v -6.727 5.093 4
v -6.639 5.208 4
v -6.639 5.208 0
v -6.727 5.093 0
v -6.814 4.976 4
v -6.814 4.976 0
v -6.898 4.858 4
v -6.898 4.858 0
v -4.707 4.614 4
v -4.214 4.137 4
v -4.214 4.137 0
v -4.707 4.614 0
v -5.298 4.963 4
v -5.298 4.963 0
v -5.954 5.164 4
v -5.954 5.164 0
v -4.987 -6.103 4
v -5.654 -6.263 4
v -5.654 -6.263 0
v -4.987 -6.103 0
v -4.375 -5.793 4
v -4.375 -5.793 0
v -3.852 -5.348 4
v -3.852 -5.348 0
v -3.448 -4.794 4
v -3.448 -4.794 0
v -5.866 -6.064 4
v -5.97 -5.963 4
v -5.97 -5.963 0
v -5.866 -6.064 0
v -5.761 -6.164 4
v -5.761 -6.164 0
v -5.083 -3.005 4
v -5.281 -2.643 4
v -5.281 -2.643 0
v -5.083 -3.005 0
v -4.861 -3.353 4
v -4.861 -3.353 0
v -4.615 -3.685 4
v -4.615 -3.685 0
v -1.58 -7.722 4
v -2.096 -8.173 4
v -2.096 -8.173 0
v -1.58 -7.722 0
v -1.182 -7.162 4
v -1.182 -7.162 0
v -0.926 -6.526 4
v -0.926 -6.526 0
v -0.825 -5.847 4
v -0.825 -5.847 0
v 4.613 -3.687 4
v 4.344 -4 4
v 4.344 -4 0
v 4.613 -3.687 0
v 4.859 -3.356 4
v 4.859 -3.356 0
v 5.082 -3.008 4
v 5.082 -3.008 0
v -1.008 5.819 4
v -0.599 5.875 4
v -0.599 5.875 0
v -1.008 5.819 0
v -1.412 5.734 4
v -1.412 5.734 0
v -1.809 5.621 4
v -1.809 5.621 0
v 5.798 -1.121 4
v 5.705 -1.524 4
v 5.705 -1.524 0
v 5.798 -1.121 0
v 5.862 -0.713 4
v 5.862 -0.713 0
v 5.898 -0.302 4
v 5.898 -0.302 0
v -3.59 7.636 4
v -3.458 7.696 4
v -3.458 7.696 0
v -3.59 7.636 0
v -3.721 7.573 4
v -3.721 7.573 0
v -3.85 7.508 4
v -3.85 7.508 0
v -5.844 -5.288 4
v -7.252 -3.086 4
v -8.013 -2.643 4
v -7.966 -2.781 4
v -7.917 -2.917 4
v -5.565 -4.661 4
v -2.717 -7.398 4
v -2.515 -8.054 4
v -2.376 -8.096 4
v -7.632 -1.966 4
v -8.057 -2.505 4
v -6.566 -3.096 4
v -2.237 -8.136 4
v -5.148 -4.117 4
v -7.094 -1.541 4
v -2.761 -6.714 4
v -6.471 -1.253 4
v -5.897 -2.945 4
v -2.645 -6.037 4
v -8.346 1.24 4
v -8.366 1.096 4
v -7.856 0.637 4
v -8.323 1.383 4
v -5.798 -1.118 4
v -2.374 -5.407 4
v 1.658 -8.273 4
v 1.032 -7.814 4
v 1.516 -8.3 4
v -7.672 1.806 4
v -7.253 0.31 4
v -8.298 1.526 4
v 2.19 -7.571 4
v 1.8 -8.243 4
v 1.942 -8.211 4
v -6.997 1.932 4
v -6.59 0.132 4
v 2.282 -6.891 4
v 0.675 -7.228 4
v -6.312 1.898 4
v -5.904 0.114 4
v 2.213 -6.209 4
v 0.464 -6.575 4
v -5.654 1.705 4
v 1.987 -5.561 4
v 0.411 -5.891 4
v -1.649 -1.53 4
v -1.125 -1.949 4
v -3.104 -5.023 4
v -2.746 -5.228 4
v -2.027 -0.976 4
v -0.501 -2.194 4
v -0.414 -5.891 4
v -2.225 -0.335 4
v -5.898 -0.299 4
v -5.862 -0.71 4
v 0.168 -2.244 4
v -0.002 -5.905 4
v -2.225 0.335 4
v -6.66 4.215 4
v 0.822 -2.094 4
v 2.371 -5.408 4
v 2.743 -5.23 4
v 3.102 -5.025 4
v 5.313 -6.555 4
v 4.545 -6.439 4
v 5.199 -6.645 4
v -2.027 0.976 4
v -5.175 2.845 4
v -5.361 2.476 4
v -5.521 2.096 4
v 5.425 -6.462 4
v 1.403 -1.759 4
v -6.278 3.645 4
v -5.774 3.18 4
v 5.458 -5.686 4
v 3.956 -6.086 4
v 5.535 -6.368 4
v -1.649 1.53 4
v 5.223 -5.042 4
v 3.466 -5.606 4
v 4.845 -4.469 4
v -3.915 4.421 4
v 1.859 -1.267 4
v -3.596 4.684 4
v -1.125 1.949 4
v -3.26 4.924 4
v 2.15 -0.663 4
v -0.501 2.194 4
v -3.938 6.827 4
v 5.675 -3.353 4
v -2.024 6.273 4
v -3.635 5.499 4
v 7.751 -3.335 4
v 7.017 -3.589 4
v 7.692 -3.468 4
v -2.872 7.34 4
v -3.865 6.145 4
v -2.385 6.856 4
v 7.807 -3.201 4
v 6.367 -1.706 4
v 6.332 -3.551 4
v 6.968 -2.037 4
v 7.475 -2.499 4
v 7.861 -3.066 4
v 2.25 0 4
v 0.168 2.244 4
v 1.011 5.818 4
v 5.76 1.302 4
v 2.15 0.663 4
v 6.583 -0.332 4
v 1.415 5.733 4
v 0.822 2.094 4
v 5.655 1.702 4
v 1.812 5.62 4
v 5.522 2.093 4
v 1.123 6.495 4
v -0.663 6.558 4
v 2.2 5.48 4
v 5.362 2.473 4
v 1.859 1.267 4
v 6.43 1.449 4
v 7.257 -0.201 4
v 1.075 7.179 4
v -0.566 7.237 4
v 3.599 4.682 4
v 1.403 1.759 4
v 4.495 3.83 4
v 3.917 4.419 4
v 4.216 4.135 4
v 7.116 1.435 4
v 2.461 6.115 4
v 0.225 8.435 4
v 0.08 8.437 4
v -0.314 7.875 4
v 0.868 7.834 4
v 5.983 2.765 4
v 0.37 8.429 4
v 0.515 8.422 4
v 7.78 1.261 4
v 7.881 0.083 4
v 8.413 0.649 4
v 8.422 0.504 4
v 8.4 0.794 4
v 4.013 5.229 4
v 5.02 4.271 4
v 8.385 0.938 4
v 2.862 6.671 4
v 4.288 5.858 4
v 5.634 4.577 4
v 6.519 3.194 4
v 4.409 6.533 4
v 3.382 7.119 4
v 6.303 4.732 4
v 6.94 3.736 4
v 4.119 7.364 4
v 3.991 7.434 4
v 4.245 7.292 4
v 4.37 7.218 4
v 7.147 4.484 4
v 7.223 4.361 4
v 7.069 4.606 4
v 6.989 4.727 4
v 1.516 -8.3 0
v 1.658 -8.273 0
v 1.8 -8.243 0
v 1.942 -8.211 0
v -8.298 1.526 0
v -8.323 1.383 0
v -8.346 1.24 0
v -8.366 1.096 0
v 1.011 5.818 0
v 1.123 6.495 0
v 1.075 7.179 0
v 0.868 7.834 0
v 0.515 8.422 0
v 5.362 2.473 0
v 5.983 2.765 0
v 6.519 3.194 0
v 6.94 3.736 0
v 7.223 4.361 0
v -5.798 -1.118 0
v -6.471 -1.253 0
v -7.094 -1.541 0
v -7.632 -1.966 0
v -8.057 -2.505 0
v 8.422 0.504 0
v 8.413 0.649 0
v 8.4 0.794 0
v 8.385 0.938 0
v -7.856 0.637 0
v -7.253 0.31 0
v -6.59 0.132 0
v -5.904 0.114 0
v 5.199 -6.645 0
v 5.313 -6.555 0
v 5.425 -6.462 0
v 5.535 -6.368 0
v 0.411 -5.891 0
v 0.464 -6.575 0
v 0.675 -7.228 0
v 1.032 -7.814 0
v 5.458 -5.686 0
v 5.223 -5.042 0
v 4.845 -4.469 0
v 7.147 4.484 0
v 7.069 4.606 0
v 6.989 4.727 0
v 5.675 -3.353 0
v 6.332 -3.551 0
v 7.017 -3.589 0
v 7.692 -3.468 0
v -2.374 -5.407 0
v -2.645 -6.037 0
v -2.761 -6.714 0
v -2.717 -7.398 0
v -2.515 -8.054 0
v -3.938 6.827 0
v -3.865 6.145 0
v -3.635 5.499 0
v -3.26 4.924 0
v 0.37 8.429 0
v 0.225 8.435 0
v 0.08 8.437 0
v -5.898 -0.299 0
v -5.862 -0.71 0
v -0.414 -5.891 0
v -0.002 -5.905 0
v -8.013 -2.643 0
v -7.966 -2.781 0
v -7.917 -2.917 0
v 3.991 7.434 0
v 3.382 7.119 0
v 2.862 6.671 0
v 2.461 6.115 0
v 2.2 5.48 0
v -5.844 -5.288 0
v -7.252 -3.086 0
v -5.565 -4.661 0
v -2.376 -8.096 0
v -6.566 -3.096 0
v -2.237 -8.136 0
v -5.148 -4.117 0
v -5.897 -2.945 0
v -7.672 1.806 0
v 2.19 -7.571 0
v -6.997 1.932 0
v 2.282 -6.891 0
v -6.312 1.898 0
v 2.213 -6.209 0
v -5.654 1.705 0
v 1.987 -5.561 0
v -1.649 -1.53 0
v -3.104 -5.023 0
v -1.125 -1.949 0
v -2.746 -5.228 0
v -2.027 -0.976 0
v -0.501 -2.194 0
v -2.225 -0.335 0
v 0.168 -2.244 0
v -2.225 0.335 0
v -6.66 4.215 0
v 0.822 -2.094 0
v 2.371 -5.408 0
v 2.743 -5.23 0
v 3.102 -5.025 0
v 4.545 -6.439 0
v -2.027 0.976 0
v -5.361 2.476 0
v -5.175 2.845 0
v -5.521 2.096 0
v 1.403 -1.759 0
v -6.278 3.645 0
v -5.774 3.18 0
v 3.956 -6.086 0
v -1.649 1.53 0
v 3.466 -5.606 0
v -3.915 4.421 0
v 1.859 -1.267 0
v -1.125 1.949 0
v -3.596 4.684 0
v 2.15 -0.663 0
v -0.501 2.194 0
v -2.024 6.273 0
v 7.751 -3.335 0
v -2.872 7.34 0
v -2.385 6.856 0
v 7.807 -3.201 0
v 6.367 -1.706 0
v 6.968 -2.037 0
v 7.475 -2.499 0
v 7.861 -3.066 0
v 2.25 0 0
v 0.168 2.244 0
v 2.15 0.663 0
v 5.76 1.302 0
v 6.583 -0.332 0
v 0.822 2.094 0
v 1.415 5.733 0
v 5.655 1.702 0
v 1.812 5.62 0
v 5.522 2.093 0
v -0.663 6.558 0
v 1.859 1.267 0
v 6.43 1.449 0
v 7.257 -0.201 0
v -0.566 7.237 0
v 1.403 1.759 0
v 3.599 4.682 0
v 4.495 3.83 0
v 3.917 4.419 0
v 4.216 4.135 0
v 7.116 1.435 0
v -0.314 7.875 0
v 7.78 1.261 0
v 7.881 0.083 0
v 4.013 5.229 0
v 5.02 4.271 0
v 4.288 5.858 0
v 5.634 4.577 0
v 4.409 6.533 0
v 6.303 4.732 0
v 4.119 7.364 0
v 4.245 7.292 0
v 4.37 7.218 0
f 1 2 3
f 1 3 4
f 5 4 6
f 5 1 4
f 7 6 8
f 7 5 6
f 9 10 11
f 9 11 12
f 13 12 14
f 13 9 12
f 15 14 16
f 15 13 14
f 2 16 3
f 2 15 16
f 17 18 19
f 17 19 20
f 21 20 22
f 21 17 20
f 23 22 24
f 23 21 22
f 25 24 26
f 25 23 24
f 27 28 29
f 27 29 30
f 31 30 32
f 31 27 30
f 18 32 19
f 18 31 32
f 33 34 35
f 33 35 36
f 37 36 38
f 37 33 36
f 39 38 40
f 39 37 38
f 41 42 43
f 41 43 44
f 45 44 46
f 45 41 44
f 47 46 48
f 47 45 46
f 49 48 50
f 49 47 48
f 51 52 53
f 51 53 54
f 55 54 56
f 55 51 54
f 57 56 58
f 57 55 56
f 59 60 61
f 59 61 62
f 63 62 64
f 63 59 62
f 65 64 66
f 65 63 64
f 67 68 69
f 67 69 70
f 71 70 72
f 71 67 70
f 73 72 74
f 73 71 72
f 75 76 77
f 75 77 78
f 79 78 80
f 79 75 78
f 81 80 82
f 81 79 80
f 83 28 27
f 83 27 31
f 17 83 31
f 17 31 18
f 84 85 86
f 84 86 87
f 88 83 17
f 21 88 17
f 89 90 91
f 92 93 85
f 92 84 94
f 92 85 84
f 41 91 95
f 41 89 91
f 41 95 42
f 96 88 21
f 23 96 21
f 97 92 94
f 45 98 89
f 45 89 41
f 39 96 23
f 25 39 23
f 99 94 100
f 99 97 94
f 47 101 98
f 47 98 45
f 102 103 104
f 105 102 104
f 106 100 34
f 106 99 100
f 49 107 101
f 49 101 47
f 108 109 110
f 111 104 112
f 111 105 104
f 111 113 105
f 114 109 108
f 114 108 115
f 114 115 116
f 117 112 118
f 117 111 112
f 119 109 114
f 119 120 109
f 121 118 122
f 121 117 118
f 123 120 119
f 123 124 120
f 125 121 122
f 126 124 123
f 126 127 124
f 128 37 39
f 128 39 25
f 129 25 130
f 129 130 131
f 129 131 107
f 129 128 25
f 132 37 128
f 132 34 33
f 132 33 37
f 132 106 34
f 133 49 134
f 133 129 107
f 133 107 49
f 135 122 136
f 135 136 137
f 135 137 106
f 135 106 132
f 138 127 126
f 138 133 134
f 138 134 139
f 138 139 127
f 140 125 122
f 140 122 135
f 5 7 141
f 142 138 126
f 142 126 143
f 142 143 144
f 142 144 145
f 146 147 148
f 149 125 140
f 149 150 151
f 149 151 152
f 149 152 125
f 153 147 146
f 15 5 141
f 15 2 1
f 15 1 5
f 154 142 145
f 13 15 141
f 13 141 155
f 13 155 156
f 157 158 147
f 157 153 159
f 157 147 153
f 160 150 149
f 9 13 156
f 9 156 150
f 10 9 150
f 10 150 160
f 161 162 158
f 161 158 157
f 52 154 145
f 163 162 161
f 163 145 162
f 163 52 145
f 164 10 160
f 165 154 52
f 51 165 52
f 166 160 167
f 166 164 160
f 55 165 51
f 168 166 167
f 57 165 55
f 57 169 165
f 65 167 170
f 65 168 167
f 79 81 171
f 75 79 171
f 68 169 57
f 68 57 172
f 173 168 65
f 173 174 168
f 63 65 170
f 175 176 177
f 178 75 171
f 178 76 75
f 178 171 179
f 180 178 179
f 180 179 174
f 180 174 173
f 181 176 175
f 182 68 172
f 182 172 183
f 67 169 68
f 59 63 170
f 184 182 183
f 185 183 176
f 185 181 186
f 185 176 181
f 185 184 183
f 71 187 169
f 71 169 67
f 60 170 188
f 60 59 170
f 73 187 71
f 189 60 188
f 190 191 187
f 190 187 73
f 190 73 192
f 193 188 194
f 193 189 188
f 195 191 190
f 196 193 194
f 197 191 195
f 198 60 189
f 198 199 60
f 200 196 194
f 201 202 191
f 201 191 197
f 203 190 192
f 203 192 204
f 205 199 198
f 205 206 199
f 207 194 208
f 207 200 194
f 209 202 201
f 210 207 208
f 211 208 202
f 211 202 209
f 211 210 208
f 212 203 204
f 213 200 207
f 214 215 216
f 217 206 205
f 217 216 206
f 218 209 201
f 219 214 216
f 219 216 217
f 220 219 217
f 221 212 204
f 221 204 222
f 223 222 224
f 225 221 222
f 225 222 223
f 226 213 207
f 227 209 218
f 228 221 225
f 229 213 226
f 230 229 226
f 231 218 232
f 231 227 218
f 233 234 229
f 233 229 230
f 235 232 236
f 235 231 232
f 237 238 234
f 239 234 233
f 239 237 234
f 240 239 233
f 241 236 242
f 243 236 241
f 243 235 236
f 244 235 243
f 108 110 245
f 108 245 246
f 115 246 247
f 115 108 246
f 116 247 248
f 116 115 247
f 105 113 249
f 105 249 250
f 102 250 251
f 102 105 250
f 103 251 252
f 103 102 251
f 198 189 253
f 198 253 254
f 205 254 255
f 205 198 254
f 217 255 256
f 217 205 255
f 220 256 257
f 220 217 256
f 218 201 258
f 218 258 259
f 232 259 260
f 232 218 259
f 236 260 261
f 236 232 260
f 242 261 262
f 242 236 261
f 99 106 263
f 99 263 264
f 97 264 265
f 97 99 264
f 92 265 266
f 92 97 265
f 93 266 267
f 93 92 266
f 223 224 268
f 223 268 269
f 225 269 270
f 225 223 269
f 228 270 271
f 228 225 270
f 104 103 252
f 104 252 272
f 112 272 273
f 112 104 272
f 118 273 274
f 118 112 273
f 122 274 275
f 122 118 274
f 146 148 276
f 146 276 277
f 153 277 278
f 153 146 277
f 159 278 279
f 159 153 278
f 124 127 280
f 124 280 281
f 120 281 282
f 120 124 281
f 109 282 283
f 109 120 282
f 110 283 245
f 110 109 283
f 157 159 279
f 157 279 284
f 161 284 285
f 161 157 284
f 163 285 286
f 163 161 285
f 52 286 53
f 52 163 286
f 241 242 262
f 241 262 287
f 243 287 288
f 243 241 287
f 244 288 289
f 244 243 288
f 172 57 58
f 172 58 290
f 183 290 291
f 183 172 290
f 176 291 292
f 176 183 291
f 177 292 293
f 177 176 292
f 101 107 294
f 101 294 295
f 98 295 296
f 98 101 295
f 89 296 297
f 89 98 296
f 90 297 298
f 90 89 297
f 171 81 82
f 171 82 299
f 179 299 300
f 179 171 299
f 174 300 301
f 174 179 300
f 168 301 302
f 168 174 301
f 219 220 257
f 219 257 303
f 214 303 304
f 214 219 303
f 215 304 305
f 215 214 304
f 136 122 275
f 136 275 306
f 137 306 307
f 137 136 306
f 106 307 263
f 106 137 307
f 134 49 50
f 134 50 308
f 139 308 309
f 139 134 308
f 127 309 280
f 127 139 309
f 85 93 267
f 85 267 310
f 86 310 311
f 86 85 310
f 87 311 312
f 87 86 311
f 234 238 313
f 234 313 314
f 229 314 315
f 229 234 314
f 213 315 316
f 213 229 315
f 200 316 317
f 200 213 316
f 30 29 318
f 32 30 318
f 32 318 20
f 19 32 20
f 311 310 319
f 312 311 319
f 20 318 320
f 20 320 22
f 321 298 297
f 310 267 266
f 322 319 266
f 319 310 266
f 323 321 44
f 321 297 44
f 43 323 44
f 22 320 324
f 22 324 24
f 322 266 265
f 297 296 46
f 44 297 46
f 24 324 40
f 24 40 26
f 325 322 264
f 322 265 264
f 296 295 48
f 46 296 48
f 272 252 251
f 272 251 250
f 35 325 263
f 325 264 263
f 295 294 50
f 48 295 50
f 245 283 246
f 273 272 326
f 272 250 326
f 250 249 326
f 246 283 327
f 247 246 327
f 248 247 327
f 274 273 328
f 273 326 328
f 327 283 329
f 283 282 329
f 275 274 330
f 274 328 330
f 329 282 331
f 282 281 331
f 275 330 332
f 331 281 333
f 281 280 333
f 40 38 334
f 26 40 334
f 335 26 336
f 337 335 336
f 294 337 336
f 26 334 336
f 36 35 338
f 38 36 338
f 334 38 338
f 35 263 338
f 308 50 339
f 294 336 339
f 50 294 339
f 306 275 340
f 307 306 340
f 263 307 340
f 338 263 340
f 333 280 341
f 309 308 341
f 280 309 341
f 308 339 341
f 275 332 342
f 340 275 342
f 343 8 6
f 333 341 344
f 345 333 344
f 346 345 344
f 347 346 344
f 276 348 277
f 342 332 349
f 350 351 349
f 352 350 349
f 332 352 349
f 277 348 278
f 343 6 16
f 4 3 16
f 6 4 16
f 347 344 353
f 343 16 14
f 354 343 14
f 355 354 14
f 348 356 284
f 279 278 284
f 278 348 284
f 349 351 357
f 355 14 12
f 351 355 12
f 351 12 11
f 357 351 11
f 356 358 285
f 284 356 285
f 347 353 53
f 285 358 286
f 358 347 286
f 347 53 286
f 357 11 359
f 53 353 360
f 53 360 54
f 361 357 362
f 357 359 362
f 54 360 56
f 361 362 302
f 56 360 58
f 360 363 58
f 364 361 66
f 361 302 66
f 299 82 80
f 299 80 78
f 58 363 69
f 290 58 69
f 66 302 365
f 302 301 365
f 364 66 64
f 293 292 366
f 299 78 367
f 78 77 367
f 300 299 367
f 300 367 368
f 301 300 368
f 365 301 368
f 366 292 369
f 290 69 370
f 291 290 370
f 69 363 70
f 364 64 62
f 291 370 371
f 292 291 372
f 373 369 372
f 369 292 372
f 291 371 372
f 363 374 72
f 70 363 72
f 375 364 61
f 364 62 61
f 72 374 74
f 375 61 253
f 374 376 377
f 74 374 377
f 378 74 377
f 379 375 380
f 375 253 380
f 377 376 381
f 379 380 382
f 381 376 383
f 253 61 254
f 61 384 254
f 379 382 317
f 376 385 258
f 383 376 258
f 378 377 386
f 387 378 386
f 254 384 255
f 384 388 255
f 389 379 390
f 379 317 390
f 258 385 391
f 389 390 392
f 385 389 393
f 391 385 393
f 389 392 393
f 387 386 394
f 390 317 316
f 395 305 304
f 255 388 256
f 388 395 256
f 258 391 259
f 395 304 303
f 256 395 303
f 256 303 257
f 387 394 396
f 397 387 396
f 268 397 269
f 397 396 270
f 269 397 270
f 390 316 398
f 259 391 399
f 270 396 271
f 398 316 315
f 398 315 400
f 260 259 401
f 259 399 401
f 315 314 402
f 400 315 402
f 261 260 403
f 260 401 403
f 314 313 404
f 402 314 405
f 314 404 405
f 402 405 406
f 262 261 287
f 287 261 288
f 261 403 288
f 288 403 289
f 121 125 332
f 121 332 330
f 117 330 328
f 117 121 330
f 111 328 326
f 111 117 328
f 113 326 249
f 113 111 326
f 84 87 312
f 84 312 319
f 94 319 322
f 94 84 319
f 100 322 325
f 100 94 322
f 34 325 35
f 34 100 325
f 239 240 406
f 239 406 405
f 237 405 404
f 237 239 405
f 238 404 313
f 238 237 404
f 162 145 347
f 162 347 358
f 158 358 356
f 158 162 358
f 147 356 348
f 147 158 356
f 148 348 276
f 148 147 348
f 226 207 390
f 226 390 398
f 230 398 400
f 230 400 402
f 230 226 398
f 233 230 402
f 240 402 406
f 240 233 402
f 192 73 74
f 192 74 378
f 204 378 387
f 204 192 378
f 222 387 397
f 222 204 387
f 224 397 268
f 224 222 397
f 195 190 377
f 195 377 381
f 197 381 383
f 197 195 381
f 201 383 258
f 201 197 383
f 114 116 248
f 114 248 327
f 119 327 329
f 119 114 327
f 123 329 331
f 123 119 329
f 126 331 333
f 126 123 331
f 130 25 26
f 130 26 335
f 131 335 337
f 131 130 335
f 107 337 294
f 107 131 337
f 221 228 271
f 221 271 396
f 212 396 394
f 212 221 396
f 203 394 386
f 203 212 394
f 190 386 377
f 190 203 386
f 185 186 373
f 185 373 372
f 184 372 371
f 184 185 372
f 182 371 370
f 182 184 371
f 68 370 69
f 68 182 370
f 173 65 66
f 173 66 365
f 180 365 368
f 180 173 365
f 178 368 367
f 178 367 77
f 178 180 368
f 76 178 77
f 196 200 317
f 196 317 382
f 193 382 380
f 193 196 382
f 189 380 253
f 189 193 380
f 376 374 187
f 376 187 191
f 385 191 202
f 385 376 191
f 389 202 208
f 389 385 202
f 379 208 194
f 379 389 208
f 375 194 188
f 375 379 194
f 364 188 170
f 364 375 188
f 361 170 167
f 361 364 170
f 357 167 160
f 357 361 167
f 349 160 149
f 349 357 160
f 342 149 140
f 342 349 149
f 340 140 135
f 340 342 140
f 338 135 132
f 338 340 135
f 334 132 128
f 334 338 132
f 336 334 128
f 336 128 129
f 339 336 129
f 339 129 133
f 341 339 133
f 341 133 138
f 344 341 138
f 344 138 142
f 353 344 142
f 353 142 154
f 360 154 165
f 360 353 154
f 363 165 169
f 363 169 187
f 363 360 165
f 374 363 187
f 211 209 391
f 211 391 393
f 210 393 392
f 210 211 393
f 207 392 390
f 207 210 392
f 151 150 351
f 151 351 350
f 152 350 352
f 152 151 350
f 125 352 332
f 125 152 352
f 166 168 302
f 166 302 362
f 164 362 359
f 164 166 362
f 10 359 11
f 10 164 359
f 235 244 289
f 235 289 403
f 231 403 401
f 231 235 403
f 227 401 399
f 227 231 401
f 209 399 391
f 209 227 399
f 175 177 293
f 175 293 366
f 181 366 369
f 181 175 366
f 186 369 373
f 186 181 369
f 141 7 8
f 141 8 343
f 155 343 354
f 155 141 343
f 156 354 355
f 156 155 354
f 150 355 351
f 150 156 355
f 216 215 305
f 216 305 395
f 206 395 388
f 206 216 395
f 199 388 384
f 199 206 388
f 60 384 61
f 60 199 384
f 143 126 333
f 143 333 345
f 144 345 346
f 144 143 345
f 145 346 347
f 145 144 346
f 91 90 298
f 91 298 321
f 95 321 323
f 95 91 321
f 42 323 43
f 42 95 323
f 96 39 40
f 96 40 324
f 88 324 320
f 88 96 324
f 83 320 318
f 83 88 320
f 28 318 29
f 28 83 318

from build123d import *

# Parameters (mm, degrees)
SKETCH1_R           = 9.5
SKETCH1_R_2         = 2.25
BOSS_EXTRUDE1_DEPTH = 4
SKETCH2_R           = 9.5
CUT_EXTRUDE1_DEPTH  = 15.017845769


with BuildPart() as part:
    # Sketch1 → Boss-Extrude1 (new body)
    with BuildSketch(Plane.XY):
        Circle(SKETCH1_R)
        Circle(SKETCH1_R_2, mode=Mode.SUBTRACT)
    extrude(amount=BOSS_EXTRUDE1_DEPTH)

    # Sketch2 → Cut-Extrude1 (cut, through all)
    with BuildSketch(Plane.XY.offset(4)):
        Circle(SKETCH2_R)
        with BuildLine():
            ThreePointArc((5.362381822, 2.473224364), (6.518915118, 3.194006906), (7.223355975, 4.36056587))
            ThreePointArc((7.223355975, 4.36056587), (7.108458656, 4.54546167), (6.988829661, 4.727331828))
            ThreePointArc((6.988829661, 4.727331828), (5.634356921, 4.57733072), (4.4948488, 3.829923215))
            ThreePointArc((4.4948488, 3.829923215), (4.069180633, 4.279456337), (3.598788625, 4.681954506))
            ThreePointArc((3.598788625, 4.681954506), (4.287883651, 5.857643573), (4.369508071, 7.217950226))
            ThreePointArc((4.369508071, 7.217950226), (4.181846184, 7.32827188), (3.991400694, 7.433715542))
            ThreePointArc((3.991400694, 7.433715542), (2.861783635, 6.671441288), (2.200136889, 5.48008898))
            ThreePointArc((2.200136889, 5.48008898), (1.614317987, 5.680312931), (1.010756324, 5.818105294))
            ThreePointArc((1.010756324, 5.818105294), (1.074549714, 7.179364689), (0.514658525, 8.421789172))
            ThreePointArc((0.514658525, 8.421789172), (0.297223149, 8.432263317), (0.079589928, 8.437124611))
            ThreePointArc((0.079589928, 8.437124611), (-0.566389794, 7.237205057), (-0.598599868, 5.874832403))
            ThreePointArc((-0.598599868, 5.874832403), (-1.210365455, 5.779878288), (-1.80882807, 5.621398276))
            ThreePointArc((-1.80882807, 5.621398276), (-2.384950613, 6.856379876), (-3.458093086, 7.696297711))
            ThreePointArc((-3.458093086, 7.696297711), (-3.655490128, 7.604524849), (-3.85045393, 7.50769011))
            ThreePointArc((-3.85045393, 7.50769011), (-3.864810147, 6.145012365), (-3.26020461, 4.923722521))
            ThreePointArc((-3.26020461, 4.923722521), (-3.757768757, 4.555343184), (-4.214031752, 4.136896657))
            ThreePointArc((-4.214031752, 4.136896657), (-5.298087496, 4.962681062), (-6.638637245, 5.207677196))
            ThreePointArc((-6.638637245, 5.207677196), (-6.77077467, 5.034681382), (-6.898405196, 4.858334282))
            ThreePointArc((-6.898405196, 4.858334282), (-6.277849071, 3.645071395), (-5.174935765, 2.844647147))
            ThreePointArc((-5.174935765, 2.844647147), (-5.444312524, 2.287233855), (-5.653851544, 1.70468187))
            ThreePointArc((-5.653851544, 1.70468187), (-6.997496382, 1.932091823), (-8.298349616, 1.526040594))
            ThreePointArc((-8.298349616, 1.526040594), (-8.334956332, 1.311453085), (-8.366014967, 1.09599262))
            ThreePointArc((-8.366014967, 1.09599262), (-7.252708429, 0.310088497), (-5.904151501, 0.113897393))
            ThreePointArc((-5.904151501, 0.113897393), (-5.883629902, -0.504853187), (-5.798442084, -1.118054991))
            ThreePointArc((-5.798442084, -1.118054991), (-7.093863177, -1.541116368), (-8.057010096, -2.505193517))
            ThreePointArc((-8.057010096, -2.505193517), (-7.989699945, -2.712213309), (-7.91707153, -2.917427744))
            ThreePointArc((-7.91707153, -2.917427744), (-6.566059691, -3.095931939), (-5.280797281, -2.64294488))
            ThreePointArc((-5.280797281, -2.64294488), (-4.975078575, -3.181284447), (-4.614679421, -3.684658927))
            ThreePointArc((-4.614679421, -3.684658927), (-5.565111408, -4.661273372), (-5.969906661, -5.962517984))
            ThreePointArc((-5.969906661, -5.962517984), (-5.814099587, -6.11454432), (-5.654422416, -6.26250057))
            ThreePointArc((-5.654422416, -6.26250057), (-4.375205807, -5.792711678), (-3.447676044, -4.794320333))
            ThreePointArc((-3.447676044, -4.794320333), (-2.926796703, -5.12892178), (-2.373749315, -5.407151907))
            ThreePointArc((-2.373749315, -5.407151907), (-2.761459682, -6.713588821), (-2.515169554, -8.053901437))
            ThreePointArc((-2.515169554, -8.053901437), (-2.306559081, -8.116106915), (-2.096413271, -8.172909987))
            ThreePointArc((-2.096413271, -8.172909987), (-1.182045, -7.162450981), (-0.824733775, -5.847374775))
            ThreePointArc((-0.824733775, -5.847374775), (-0.208020978, -5.901584943), (0.410978151, -5.89093155))
            ThreePointArc((0.410978151, -5.89093155), (0.674809178, -7.227901978), (1.515762586, -8.300233131))
            ThreePointArc((1.515762586, -8.300233131), (1.729386313, -8.258367225), (1.941858891, -8.21100422))
            ThreePointArc((1.941858891, -8.21100422), (2.281908072, -6.891359081), (1.987145063, -5.560866125))
            ThreePointArc((1.987145063, -5.560866125), (2.558409847, -5.322266117), (3.101555477, -5.025169767))
            ThreePointArc((3.101555477, -5.025169767), (3.956487387, -6.086389898), (5.199451785, -6.645081443))
            ThreePointArc((5.199451785, -6.645081443), (5.369150144, -6.508735129), (5.535274583, -6.368056339))
            ThreePointArc((5.535274583, -6.368056339), (5.223103504, -5.041539866), (4.343792915, -4.000430061))
            ThreePointArc((4.343792915, -4.000430061), (4.738739807, -3.523680264), (5.08160382, -3.008202151))
            ThreePointArc((5.08160382, -3.008202151), (6.331782017, -3.550559241), (7.69200924, -3.467621679))
            ThreePointArc((7.69200924, -3.467621679), (7.778906383, -3.268030253), (7.860625575, -3.066263495))
            ThreePointArc((7.860625575, -3.066263495), (6.967748869, -2.036764624), (5.705330158, -1.523543681))
            ThreePointArc((5.705330158, -1.523543681), (5.833481586, -0.917861728), (5.897517968, -0.302091675))
            ThreePointArc((5.897517968, -0.302091675), (7.256541693, -0.201338251), (8.422420077, 0.504228423))
            ThreePointArc((8.422420077, 0.504228423), (8.406608915, 0.72134097), (8.385201978, 0.937973363))
            ThreePointArc((8.385201978, 0.937973363), (7.116166938, 1.434608847), (5.759845019, 1.302368196))
            ThreePointArc((5.759845019, 1.302368196), (5.591843034, 1.898227869), (5.362381822, 2.473224364))
        make_face(mode=Mode.SUBTRACT)
    extrude(amount=-CUT_EXTRUDE1_DEPTH, mode=Mode.SUBTRACT)


solid = part.part
